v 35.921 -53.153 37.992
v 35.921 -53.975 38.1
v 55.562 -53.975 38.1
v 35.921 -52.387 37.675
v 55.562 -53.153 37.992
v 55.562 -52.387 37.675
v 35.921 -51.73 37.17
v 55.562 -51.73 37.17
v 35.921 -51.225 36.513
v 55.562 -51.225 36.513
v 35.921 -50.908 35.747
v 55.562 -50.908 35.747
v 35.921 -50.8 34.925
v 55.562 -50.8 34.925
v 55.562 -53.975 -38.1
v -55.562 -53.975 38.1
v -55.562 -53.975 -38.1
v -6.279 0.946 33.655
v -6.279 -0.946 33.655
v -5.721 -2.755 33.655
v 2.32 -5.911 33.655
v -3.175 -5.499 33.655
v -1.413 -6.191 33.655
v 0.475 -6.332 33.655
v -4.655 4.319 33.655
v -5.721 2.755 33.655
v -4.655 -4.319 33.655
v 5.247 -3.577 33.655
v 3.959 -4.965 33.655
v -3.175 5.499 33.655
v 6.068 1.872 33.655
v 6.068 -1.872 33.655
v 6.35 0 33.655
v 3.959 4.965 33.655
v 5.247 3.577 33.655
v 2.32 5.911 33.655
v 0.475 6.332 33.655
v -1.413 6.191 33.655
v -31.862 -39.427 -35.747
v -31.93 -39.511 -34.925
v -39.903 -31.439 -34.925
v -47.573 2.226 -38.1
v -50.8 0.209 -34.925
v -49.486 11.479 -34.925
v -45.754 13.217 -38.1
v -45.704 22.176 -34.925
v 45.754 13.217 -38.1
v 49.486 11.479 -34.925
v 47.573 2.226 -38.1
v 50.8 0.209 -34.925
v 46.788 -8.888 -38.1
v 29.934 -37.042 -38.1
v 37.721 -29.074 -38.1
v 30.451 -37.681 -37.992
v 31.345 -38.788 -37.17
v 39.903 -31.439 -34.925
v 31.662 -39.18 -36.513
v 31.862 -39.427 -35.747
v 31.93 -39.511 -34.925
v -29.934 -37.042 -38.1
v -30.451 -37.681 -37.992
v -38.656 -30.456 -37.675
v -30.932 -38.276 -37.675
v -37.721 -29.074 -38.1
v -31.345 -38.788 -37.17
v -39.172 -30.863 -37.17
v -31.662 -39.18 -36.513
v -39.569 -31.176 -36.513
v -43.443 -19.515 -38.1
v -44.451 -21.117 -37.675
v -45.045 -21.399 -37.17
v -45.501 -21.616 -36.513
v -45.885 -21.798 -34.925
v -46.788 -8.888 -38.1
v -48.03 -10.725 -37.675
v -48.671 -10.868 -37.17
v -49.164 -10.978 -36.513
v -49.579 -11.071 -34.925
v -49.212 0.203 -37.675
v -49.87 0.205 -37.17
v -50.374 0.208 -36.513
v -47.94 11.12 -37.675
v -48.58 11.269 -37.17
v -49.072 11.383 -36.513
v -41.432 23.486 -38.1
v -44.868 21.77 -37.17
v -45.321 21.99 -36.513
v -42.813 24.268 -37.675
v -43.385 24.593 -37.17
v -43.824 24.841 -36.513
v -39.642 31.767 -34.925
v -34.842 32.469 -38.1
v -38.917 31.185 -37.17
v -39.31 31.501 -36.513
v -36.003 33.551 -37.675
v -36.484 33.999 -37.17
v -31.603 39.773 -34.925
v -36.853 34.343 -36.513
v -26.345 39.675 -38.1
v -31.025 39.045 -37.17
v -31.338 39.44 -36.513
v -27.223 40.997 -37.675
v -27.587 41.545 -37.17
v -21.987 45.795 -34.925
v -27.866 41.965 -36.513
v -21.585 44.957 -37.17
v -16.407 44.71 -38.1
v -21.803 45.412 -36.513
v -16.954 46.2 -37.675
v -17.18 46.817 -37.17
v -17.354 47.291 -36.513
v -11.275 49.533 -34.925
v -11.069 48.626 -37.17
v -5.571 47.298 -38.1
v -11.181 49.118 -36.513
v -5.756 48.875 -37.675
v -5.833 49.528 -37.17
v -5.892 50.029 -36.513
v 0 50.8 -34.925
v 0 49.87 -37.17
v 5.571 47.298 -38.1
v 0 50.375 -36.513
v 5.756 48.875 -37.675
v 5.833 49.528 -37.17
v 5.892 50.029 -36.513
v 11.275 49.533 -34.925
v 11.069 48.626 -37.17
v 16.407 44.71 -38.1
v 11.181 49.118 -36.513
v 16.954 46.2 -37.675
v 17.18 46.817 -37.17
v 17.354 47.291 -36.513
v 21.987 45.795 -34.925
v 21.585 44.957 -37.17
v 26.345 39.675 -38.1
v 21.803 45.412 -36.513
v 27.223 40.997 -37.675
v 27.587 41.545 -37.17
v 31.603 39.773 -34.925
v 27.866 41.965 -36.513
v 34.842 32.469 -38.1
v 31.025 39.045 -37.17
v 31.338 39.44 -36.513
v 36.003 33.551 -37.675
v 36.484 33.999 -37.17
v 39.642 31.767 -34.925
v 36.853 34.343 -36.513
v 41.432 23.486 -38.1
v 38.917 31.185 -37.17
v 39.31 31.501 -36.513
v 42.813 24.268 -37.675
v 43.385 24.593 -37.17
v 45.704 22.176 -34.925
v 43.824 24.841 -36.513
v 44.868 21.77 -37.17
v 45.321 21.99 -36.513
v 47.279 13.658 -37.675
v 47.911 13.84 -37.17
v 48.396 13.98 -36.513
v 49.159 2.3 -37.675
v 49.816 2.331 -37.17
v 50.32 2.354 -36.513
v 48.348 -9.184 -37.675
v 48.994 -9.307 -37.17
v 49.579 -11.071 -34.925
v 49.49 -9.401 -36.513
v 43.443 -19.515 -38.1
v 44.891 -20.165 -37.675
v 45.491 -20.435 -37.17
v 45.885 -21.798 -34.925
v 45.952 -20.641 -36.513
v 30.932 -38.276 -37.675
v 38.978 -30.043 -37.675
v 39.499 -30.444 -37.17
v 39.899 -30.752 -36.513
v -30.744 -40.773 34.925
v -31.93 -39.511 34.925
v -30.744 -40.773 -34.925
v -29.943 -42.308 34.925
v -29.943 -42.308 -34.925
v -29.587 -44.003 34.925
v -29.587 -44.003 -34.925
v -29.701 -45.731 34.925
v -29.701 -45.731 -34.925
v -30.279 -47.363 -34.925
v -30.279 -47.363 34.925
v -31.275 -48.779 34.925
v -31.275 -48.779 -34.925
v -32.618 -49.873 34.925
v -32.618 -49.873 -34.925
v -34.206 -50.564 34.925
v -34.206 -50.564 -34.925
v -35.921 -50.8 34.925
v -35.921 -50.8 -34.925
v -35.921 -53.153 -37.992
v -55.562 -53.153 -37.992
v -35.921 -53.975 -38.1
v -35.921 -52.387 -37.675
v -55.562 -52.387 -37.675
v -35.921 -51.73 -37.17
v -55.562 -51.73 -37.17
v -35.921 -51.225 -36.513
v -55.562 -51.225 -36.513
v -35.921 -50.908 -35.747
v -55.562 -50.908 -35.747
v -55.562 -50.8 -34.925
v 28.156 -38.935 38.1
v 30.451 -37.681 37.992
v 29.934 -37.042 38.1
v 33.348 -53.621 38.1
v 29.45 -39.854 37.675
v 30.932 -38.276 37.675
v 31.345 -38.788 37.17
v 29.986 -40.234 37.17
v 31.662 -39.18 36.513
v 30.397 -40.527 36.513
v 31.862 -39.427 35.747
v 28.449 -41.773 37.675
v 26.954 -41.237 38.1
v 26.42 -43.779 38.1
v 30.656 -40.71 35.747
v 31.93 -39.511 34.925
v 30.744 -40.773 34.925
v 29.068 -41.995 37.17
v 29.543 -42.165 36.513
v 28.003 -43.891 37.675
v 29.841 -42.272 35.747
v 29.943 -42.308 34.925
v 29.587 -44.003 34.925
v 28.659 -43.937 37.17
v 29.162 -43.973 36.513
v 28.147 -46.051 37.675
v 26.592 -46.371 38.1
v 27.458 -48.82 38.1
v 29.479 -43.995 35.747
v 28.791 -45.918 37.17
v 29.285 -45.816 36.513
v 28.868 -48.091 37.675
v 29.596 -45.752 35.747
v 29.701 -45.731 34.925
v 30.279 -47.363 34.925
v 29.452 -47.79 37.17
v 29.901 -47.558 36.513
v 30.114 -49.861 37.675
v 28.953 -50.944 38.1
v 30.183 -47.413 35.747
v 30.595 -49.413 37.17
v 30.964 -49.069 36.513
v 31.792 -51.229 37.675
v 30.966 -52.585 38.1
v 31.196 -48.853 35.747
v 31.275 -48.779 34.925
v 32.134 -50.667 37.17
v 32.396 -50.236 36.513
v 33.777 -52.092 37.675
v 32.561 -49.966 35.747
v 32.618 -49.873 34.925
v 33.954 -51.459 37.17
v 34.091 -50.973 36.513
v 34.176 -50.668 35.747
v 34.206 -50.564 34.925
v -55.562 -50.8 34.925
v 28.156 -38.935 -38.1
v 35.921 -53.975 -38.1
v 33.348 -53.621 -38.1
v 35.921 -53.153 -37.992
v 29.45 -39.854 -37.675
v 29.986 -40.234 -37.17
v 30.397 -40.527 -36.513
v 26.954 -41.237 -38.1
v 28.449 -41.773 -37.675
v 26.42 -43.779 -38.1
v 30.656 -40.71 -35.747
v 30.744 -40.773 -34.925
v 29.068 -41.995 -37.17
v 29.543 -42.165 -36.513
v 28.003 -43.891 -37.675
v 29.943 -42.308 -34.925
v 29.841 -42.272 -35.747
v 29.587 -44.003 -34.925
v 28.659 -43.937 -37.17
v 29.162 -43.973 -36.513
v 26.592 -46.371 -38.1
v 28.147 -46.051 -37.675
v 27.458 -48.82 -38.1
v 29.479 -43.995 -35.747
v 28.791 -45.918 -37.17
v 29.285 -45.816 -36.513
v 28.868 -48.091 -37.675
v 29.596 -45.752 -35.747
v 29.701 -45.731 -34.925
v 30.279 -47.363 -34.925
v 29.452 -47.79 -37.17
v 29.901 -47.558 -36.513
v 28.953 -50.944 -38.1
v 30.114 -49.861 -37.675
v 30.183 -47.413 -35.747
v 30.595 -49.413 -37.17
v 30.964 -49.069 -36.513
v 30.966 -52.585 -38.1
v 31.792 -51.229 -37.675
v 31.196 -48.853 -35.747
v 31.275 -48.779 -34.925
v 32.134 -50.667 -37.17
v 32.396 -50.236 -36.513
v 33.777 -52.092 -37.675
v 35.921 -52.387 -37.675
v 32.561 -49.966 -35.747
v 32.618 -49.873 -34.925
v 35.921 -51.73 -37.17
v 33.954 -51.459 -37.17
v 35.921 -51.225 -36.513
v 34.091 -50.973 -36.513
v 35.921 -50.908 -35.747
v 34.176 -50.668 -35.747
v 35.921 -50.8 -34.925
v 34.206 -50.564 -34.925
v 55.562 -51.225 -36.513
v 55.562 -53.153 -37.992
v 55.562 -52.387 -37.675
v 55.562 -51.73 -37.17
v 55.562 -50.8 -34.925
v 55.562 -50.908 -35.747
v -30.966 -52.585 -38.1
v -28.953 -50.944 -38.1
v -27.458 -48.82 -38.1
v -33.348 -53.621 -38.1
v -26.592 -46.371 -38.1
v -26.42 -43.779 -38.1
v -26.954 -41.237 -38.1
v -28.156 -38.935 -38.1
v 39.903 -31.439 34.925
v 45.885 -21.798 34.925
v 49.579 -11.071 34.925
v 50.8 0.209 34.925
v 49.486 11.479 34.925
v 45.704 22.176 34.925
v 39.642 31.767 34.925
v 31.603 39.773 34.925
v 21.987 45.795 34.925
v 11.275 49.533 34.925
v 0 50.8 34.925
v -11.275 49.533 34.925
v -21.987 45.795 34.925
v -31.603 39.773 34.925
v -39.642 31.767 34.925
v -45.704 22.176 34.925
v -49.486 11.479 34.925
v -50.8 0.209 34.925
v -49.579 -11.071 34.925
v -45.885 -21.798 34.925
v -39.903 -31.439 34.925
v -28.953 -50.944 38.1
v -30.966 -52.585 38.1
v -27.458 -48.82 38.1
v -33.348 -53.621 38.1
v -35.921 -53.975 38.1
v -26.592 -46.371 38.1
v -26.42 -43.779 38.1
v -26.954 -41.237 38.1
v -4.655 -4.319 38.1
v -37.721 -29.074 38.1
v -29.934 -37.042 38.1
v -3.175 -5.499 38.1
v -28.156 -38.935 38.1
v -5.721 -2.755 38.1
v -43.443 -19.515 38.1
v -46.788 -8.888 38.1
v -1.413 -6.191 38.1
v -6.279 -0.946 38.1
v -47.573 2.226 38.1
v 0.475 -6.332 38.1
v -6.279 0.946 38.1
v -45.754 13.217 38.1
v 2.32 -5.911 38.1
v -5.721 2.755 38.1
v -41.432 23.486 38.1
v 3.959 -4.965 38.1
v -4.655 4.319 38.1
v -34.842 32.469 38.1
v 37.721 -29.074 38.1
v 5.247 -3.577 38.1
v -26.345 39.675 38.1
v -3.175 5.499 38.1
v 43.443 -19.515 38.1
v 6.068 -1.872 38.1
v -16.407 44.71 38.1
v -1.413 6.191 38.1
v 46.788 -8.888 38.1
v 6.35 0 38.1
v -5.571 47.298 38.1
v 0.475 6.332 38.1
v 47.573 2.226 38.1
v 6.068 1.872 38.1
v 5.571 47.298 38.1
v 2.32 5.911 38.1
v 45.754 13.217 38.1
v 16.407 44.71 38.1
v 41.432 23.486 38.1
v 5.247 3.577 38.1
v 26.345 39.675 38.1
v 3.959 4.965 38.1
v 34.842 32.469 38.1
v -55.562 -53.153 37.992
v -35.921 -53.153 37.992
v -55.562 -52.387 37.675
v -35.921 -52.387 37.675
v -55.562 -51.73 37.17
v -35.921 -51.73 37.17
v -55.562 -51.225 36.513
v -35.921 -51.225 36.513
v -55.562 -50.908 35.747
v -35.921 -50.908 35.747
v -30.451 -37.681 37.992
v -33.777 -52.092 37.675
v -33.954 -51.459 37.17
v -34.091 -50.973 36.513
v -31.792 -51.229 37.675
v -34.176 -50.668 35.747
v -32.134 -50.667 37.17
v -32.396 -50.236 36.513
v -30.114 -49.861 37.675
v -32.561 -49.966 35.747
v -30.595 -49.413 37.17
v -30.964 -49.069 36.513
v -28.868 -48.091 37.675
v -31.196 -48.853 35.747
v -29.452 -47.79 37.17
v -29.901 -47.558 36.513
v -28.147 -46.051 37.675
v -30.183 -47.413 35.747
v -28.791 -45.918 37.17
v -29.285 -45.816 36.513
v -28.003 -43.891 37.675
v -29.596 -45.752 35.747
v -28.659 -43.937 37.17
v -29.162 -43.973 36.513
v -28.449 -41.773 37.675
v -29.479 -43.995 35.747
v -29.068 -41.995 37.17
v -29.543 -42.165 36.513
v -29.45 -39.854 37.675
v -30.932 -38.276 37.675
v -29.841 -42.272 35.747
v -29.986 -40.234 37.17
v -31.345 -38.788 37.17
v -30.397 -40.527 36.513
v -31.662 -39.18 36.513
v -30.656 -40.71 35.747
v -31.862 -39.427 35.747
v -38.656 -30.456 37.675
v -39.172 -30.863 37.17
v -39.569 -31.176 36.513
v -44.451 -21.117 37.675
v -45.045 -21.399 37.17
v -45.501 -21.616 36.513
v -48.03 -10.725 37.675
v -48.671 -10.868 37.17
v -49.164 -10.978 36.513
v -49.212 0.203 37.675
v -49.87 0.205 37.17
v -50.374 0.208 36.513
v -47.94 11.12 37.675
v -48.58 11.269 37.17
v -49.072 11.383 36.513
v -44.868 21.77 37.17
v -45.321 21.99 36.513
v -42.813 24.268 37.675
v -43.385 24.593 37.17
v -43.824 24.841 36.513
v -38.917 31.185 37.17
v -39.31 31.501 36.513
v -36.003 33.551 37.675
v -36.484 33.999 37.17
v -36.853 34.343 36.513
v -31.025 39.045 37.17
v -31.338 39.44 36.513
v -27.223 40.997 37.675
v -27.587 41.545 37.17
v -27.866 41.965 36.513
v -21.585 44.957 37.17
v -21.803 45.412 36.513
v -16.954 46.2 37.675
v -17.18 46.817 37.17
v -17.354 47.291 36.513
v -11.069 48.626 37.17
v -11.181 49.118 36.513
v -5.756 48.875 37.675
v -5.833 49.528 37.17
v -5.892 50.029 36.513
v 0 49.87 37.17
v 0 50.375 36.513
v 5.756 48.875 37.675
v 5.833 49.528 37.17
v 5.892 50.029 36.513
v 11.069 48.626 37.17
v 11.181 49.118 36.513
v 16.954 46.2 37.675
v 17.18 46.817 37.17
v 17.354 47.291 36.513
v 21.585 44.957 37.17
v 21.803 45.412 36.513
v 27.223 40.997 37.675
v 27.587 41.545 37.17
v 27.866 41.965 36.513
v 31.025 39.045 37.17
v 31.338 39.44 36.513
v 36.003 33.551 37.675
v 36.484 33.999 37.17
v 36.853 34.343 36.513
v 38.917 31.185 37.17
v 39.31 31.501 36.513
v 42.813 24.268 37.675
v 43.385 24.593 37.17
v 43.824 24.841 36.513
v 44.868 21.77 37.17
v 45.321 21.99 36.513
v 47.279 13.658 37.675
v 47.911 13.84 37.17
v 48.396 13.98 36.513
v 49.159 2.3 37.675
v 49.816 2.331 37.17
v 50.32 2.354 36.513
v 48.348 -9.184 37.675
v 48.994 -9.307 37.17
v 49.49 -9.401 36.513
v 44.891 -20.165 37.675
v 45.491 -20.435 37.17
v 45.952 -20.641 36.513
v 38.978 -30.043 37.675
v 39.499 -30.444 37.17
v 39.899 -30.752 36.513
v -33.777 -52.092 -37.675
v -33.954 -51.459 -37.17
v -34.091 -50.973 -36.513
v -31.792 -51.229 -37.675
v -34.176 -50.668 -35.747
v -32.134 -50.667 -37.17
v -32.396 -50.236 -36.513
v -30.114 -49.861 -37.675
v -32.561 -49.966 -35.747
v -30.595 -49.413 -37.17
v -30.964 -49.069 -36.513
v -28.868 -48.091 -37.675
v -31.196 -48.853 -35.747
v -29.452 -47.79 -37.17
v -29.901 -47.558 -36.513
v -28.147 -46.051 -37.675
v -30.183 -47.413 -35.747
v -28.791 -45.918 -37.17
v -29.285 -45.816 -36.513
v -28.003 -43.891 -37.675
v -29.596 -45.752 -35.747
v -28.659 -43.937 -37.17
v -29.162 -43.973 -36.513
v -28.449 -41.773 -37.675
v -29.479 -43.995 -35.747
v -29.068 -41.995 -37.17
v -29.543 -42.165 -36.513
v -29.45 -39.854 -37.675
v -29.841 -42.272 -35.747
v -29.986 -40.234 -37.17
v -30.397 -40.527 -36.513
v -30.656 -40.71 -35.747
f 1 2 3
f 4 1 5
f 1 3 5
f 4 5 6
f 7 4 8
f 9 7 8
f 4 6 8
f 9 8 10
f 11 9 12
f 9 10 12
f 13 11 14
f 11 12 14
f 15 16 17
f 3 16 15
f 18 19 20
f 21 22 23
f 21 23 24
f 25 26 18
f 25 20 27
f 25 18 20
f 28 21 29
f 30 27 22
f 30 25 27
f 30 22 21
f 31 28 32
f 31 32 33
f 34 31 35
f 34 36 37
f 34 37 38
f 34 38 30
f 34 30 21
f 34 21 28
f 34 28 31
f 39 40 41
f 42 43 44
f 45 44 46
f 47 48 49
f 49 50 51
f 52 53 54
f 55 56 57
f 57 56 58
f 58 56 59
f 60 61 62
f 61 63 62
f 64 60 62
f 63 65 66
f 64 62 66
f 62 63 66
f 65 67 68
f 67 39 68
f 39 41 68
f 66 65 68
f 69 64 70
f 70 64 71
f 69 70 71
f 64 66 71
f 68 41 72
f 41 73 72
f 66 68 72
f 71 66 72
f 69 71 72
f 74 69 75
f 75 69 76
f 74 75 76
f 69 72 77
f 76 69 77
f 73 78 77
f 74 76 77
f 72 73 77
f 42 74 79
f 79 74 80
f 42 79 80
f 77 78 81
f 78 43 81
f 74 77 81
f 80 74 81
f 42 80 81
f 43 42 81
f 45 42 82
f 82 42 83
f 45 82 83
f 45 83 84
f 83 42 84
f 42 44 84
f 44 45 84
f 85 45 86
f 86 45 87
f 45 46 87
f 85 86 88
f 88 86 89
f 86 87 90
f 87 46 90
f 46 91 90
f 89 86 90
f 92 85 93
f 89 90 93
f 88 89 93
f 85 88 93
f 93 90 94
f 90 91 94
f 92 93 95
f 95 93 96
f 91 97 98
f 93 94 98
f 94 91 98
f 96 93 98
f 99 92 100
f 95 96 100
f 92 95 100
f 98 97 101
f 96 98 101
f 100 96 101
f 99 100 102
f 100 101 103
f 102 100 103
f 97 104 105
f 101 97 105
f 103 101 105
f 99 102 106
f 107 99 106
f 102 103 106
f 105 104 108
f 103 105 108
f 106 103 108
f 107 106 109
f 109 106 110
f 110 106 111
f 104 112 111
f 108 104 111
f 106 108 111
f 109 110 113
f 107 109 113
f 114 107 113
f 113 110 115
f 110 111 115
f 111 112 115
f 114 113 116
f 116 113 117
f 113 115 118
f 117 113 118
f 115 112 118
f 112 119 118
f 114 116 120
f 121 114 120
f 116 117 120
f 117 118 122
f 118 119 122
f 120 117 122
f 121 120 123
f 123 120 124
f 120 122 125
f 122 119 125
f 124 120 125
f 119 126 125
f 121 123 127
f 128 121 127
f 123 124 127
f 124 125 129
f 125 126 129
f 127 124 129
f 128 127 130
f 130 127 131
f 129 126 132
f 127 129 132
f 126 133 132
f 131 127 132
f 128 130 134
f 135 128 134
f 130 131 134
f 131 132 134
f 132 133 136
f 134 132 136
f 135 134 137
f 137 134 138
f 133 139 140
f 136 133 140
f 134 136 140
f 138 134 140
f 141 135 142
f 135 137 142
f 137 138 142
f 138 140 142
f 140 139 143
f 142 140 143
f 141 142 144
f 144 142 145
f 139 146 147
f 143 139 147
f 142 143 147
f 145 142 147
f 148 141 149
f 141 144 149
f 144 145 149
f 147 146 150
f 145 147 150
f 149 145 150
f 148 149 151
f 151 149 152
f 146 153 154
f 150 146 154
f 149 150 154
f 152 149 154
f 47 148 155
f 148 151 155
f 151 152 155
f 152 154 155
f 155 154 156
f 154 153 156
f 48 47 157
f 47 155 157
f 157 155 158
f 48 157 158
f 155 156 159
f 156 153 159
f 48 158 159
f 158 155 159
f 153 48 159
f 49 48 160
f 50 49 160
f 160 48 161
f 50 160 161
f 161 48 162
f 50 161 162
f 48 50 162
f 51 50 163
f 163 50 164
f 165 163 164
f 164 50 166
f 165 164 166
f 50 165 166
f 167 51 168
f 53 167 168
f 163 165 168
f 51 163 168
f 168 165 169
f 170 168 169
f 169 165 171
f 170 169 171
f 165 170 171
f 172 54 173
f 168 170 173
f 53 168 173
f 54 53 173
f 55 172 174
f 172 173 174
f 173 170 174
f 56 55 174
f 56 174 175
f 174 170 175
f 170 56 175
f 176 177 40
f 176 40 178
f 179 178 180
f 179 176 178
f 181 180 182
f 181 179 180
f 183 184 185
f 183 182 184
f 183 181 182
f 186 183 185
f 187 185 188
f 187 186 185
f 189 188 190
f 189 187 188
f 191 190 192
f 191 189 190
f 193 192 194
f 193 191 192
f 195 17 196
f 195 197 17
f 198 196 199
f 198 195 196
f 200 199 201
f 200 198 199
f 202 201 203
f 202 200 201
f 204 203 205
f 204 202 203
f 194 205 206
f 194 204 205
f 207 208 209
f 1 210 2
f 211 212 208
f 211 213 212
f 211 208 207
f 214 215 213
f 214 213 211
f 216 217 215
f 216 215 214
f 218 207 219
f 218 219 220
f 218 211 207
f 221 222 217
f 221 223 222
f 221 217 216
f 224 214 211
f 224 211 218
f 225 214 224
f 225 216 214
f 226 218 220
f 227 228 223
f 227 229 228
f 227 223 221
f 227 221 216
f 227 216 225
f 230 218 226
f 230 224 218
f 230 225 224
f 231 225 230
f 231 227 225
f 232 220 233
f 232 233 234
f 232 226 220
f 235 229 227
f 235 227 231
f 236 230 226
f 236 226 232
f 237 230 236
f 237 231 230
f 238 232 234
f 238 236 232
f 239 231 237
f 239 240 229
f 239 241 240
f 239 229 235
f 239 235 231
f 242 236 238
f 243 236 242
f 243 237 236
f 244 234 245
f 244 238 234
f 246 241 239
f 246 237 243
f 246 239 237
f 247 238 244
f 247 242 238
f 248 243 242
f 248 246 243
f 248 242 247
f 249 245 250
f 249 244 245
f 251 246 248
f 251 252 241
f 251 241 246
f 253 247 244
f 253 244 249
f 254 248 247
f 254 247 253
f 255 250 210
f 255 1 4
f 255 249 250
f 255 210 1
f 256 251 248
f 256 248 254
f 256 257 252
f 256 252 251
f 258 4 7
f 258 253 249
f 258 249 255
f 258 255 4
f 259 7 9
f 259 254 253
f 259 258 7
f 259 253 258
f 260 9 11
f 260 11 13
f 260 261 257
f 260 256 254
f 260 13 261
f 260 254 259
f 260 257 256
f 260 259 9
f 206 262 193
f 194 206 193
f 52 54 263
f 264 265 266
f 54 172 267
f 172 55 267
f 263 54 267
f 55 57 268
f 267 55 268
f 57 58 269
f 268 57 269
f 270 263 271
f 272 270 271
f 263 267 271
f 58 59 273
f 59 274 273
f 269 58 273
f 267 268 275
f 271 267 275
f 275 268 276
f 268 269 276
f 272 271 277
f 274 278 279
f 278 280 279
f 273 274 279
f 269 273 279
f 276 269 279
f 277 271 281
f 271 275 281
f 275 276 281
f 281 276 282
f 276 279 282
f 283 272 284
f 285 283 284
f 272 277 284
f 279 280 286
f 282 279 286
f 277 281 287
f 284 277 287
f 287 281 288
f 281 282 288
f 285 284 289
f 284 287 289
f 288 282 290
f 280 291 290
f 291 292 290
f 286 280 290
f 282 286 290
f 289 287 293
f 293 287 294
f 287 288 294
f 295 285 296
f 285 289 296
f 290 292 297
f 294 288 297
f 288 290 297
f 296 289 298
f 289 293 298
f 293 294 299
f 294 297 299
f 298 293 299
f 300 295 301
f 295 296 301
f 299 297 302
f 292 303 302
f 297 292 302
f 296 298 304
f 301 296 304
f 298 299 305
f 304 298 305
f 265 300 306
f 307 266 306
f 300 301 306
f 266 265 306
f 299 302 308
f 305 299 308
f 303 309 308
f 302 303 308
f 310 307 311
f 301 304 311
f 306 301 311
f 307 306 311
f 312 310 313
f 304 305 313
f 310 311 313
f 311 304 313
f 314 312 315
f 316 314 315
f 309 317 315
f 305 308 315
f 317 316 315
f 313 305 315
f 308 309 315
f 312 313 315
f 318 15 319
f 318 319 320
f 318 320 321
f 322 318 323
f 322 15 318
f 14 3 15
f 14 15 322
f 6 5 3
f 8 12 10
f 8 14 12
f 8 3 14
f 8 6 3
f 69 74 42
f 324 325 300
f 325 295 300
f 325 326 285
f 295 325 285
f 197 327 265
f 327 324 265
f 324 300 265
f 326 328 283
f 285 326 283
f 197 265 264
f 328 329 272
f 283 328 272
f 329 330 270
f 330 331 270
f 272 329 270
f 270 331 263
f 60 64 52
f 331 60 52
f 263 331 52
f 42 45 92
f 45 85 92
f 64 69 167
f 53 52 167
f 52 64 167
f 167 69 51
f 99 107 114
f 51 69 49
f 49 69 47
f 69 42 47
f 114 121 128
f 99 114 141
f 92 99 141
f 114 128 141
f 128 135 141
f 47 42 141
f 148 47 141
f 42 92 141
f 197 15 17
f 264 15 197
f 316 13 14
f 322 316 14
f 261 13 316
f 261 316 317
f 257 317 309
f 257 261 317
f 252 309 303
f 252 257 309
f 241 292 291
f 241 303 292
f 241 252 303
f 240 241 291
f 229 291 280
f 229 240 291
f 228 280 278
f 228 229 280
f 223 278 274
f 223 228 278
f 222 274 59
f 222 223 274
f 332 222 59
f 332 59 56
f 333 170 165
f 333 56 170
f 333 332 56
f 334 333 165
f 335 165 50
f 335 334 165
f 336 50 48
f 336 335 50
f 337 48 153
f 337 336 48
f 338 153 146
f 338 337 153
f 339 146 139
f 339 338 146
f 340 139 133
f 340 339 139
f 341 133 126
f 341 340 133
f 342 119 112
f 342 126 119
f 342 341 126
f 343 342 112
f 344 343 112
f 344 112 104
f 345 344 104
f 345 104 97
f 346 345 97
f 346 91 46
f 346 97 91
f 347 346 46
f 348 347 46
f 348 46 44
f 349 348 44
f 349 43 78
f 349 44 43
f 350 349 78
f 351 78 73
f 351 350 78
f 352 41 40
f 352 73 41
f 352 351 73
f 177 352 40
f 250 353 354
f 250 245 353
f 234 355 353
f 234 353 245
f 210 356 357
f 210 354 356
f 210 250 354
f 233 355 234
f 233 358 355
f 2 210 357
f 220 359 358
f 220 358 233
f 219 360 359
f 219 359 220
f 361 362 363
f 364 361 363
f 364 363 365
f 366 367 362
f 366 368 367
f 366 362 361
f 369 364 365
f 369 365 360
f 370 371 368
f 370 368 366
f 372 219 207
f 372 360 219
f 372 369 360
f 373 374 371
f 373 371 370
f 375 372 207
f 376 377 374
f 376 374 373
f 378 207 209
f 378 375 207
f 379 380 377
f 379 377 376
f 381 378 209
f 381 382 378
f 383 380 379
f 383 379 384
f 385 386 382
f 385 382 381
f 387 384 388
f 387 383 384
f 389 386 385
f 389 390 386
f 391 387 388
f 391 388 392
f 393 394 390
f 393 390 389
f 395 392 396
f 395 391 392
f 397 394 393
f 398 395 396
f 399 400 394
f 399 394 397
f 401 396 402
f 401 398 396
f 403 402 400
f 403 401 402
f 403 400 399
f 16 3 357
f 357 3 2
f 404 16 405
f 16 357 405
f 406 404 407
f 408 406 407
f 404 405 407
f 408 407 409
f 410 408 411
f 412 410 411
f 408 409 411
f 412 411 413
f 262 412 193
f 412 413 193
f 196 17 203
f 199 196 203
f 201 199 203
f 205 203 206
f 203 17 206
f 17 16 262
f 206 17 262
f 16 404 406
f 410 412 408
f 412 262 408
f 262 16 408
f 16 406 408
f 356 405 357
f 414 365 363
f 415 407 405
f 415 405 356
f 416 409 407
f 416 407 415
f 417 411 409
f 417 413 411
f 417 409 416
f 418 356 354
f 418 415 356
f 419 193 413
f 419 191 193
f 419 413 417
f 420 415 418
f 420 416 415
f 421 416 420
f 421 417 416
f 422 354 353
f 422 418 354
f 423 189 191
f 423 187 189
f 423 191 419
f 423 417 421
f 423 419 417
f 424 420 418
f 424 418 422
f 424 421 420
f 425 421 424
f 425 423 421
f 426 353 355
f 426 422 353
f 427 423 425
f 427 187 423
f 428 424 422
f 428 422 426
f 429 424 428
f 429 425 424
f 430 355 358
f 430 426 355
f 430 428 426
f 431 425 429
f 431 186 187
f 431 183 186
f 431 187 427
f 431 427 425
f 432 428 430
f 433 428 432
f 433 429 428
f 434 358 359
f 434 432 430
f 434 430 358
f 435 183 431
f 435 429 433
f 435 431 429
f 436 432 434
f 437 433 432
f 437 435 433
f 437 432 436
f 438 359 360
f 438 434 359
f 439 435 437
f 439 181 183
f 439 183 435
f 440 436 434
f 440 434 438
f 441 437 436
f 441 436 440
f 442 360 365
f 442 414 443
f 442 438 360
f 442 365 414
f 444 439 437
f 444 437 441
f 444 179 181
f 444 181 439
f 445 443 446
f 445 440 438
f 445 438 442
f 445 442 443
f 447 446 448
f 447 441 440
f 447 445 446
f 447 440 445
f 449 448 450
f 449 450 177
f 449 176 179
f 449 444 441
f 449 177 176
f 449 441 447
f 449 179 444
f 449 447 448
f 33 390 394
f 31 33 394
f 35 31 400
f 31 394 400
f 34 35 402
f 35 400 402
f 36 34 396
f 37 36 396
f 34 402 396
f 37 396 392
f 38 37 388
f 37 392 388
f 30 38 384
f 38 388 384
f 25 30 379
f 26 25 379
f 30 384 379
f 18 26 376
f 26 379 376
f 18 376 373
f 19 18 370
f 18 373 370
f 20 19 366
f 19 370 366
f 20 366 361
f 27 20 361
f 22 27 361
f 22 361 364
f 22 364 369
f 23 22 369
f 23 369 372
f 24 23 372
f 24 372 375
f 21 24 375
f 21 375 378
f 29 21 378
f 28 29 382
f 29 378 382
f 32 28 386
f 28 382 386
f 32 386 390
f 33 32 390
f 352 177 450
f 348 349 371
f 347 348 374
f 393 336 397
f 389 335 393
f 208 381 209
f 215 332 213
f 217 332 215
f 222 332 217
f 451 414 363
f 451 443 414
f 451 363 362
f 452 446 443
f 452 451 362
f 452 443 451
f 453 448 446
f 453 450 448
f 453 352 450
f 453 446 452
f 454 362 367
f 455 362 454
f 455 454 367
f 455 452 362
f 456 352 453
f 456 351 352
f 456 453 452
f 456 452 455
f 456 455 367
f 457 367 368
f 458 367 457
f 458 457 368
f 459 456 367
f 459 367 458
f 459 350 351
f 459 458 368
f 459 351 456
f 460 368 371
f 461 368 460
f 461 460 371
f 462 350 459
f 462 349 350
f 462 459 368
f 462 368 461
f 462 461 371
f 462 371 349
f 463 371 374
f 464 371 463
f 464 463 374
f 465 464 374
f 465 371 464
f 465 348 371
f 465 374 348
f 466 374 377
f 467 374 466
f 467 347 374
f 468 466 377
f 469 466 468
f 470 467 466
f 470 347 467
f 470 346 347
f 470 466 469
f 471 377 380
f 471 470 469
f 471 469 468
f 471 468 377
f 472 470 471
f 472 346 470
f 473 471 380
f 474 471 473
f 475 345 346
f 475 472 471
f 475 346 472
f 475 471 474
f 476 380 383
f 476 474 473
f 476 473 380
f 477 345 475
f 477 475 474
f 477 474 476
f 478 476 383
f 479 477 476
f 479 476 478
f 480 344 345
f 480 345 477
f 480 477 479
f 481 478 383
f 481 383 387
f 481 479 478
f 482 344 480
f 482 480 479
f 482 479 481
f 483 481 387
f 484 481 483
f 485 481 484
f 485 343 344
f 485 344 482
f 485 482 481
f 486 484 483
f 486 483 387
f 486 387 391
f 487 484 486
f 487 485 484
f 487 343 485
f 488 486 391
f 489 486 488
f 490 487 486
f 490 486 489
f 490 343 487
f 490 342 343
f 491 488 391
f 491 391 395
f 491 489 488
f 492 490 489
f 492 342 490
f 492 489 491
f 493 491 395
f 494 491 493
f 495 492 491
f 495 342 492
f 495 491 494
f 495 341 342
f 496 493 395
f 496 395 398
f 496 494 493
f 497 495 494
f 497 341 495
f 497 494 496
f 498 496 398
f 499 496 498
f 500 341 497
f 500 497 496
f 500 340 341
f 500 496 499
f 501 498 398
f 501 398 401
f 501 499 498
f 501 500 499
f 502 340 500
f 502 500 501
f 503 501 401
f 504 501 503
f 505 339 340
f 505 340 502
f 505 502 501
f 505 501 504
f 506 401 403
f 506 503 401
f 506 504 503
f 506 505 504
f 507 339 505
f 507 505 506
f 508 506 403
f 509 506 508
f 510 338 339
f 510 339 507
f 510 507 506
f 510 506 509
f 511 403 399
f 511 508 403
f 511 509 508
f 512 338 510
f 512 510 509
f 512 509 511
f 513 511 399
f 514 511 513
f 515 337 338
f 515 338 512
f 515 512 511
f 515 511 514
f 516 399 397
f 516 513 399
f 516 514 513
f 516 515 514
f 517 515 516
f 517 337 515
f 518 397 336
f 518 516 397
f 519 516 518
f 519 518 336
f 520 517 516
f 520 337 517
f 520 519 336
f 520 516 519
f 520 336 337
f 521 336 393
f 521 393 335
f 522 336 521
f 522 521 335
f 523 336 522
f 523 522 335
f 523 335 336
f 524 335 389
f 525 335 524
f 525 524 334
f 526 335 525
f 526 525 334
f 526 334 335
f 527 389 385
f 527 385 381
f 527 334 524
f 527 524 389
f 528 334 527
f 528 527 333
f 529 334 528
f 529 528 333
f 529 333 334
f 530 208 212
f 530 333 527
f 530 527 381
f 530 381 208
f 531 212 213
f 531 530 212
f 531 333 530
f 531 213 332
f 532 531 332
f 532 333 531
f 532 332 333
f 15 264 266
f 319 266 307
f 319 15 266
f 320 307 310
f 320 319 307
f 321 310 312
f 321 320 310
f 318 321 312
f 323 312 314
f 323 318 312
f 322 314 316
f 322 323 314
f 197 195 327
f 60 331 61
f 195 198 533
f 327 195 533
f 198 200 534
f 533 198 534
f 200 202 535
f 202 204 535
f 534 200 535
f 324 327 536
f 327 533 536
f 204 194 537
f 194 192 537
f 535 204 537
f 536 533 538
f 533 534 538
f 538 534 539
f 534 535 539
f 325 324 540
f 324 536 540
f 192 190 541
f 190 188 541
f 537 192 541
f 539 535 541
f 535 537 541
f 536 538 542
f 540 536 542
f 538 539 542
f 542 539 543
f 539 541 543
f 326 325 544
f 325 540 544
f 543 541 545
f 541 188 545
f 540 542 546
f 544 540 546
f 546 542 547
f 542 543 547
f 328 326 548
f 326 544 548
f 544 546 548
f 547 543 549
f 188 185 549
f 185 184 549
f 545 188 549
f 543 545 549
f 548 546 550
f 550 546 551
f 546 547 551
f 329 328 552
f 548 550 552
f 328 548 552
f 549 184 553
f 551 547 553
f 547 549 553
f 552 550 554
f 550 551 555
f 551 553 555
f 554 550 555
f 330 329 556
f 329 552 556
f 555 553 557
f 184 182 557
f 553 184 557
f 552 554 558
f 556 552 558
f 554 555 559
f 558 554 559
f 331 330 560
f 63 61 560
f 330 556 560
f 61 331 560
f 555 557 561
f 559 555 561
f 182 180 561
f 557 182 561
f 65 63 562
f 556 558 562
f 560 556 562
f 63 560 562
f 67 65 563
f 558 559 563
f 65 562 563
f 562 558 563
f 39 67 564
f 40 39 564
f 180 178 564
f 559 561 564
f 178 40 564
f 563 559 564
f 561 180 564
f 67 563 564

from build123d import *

# Parameters (mm, degrees)
SKETCH1_R           = 50.8
SKETCH1_W           = 111.125
SKETCH1_H           = 3.175
BOSS_EXTRUDE1_DEPTH = 38.1
SKETCH2_R           = 6.35
CUT_EXTRUDE1_DEPTH  = 4.445
FILLET1_R           = 3.175


with BuildPart() as part:
    # Sketch1 → Boss-Extrude1 (new, symmetric)
    with BuildSketch(Plane.XY):
        Circle(SKETCH1_R)
        with BuildLine():
            ThreePointArc((-31.929799542, -39.511111111), (-29.93418707, -46.566666667), (-35.921024484, -50.8))
            Line((-35.921024484, -50.8), (7.4e-08, -50.8))
            ThreePointArc((7.4e-08, -50.8), (-16.933333298, -47.894699325), (-31.929799542, -39.511111111))
        make_face()
        with BuildLine():
            Line((7.4e-08, -50.8), (35.921024484, -50.8))
            ThreePointArc((35.921024484, -50.8), (29.93418707, -46.566666667), (31.929799542, -39.511111111))
            ThreePointArc((31.929799542, -39.511111111), (16.933333368, -47.8946993), (7.4e-08, -50.8))
        make_face()
        with Locations((0, -52.3875)):
            Rectangle(SKETCH1_W, SKETCH1_H)
    extrude(amount=BOSS_EXTRUDE1_DEPTH, both=True)

    # Sketch2 → Cut-Extrude1 (cut)
    with BuildSketch(Plane.XY.offset(38.1)):
        Circle(SKETCH2_R)
    extrude(amount=-CUT_EXTRUDE1_DEPTH, mode=Mode.SUBTRACT)

    # Fillet1
    fillet1_edges = [part.edges().sort_by_distance(p)[0] for p in [
        (45.741762242, -50.8, -38.1),
        (45.741762242, -50.8, 38.1),
        (29.93418707, -46.566666667, -38.1),
        (29.93418707, -46.566666667, 38.1),
        (-45.741762242, -50.8, -38.1),
        (-45.741762242, -50.8, 38.1),
        (-29.93418707, -46.566666667, -38.1),
        (-29.93418707, -46.566666667, 38.1),
        (0, 50.8, -38.1),
        (0, 50.8, 38.1),
    ]]
    fillet(fillet1_edges, radius=FILLET1_R - 0.0001)  # a hair under: the kernel refuses the full size


solid = part.part
